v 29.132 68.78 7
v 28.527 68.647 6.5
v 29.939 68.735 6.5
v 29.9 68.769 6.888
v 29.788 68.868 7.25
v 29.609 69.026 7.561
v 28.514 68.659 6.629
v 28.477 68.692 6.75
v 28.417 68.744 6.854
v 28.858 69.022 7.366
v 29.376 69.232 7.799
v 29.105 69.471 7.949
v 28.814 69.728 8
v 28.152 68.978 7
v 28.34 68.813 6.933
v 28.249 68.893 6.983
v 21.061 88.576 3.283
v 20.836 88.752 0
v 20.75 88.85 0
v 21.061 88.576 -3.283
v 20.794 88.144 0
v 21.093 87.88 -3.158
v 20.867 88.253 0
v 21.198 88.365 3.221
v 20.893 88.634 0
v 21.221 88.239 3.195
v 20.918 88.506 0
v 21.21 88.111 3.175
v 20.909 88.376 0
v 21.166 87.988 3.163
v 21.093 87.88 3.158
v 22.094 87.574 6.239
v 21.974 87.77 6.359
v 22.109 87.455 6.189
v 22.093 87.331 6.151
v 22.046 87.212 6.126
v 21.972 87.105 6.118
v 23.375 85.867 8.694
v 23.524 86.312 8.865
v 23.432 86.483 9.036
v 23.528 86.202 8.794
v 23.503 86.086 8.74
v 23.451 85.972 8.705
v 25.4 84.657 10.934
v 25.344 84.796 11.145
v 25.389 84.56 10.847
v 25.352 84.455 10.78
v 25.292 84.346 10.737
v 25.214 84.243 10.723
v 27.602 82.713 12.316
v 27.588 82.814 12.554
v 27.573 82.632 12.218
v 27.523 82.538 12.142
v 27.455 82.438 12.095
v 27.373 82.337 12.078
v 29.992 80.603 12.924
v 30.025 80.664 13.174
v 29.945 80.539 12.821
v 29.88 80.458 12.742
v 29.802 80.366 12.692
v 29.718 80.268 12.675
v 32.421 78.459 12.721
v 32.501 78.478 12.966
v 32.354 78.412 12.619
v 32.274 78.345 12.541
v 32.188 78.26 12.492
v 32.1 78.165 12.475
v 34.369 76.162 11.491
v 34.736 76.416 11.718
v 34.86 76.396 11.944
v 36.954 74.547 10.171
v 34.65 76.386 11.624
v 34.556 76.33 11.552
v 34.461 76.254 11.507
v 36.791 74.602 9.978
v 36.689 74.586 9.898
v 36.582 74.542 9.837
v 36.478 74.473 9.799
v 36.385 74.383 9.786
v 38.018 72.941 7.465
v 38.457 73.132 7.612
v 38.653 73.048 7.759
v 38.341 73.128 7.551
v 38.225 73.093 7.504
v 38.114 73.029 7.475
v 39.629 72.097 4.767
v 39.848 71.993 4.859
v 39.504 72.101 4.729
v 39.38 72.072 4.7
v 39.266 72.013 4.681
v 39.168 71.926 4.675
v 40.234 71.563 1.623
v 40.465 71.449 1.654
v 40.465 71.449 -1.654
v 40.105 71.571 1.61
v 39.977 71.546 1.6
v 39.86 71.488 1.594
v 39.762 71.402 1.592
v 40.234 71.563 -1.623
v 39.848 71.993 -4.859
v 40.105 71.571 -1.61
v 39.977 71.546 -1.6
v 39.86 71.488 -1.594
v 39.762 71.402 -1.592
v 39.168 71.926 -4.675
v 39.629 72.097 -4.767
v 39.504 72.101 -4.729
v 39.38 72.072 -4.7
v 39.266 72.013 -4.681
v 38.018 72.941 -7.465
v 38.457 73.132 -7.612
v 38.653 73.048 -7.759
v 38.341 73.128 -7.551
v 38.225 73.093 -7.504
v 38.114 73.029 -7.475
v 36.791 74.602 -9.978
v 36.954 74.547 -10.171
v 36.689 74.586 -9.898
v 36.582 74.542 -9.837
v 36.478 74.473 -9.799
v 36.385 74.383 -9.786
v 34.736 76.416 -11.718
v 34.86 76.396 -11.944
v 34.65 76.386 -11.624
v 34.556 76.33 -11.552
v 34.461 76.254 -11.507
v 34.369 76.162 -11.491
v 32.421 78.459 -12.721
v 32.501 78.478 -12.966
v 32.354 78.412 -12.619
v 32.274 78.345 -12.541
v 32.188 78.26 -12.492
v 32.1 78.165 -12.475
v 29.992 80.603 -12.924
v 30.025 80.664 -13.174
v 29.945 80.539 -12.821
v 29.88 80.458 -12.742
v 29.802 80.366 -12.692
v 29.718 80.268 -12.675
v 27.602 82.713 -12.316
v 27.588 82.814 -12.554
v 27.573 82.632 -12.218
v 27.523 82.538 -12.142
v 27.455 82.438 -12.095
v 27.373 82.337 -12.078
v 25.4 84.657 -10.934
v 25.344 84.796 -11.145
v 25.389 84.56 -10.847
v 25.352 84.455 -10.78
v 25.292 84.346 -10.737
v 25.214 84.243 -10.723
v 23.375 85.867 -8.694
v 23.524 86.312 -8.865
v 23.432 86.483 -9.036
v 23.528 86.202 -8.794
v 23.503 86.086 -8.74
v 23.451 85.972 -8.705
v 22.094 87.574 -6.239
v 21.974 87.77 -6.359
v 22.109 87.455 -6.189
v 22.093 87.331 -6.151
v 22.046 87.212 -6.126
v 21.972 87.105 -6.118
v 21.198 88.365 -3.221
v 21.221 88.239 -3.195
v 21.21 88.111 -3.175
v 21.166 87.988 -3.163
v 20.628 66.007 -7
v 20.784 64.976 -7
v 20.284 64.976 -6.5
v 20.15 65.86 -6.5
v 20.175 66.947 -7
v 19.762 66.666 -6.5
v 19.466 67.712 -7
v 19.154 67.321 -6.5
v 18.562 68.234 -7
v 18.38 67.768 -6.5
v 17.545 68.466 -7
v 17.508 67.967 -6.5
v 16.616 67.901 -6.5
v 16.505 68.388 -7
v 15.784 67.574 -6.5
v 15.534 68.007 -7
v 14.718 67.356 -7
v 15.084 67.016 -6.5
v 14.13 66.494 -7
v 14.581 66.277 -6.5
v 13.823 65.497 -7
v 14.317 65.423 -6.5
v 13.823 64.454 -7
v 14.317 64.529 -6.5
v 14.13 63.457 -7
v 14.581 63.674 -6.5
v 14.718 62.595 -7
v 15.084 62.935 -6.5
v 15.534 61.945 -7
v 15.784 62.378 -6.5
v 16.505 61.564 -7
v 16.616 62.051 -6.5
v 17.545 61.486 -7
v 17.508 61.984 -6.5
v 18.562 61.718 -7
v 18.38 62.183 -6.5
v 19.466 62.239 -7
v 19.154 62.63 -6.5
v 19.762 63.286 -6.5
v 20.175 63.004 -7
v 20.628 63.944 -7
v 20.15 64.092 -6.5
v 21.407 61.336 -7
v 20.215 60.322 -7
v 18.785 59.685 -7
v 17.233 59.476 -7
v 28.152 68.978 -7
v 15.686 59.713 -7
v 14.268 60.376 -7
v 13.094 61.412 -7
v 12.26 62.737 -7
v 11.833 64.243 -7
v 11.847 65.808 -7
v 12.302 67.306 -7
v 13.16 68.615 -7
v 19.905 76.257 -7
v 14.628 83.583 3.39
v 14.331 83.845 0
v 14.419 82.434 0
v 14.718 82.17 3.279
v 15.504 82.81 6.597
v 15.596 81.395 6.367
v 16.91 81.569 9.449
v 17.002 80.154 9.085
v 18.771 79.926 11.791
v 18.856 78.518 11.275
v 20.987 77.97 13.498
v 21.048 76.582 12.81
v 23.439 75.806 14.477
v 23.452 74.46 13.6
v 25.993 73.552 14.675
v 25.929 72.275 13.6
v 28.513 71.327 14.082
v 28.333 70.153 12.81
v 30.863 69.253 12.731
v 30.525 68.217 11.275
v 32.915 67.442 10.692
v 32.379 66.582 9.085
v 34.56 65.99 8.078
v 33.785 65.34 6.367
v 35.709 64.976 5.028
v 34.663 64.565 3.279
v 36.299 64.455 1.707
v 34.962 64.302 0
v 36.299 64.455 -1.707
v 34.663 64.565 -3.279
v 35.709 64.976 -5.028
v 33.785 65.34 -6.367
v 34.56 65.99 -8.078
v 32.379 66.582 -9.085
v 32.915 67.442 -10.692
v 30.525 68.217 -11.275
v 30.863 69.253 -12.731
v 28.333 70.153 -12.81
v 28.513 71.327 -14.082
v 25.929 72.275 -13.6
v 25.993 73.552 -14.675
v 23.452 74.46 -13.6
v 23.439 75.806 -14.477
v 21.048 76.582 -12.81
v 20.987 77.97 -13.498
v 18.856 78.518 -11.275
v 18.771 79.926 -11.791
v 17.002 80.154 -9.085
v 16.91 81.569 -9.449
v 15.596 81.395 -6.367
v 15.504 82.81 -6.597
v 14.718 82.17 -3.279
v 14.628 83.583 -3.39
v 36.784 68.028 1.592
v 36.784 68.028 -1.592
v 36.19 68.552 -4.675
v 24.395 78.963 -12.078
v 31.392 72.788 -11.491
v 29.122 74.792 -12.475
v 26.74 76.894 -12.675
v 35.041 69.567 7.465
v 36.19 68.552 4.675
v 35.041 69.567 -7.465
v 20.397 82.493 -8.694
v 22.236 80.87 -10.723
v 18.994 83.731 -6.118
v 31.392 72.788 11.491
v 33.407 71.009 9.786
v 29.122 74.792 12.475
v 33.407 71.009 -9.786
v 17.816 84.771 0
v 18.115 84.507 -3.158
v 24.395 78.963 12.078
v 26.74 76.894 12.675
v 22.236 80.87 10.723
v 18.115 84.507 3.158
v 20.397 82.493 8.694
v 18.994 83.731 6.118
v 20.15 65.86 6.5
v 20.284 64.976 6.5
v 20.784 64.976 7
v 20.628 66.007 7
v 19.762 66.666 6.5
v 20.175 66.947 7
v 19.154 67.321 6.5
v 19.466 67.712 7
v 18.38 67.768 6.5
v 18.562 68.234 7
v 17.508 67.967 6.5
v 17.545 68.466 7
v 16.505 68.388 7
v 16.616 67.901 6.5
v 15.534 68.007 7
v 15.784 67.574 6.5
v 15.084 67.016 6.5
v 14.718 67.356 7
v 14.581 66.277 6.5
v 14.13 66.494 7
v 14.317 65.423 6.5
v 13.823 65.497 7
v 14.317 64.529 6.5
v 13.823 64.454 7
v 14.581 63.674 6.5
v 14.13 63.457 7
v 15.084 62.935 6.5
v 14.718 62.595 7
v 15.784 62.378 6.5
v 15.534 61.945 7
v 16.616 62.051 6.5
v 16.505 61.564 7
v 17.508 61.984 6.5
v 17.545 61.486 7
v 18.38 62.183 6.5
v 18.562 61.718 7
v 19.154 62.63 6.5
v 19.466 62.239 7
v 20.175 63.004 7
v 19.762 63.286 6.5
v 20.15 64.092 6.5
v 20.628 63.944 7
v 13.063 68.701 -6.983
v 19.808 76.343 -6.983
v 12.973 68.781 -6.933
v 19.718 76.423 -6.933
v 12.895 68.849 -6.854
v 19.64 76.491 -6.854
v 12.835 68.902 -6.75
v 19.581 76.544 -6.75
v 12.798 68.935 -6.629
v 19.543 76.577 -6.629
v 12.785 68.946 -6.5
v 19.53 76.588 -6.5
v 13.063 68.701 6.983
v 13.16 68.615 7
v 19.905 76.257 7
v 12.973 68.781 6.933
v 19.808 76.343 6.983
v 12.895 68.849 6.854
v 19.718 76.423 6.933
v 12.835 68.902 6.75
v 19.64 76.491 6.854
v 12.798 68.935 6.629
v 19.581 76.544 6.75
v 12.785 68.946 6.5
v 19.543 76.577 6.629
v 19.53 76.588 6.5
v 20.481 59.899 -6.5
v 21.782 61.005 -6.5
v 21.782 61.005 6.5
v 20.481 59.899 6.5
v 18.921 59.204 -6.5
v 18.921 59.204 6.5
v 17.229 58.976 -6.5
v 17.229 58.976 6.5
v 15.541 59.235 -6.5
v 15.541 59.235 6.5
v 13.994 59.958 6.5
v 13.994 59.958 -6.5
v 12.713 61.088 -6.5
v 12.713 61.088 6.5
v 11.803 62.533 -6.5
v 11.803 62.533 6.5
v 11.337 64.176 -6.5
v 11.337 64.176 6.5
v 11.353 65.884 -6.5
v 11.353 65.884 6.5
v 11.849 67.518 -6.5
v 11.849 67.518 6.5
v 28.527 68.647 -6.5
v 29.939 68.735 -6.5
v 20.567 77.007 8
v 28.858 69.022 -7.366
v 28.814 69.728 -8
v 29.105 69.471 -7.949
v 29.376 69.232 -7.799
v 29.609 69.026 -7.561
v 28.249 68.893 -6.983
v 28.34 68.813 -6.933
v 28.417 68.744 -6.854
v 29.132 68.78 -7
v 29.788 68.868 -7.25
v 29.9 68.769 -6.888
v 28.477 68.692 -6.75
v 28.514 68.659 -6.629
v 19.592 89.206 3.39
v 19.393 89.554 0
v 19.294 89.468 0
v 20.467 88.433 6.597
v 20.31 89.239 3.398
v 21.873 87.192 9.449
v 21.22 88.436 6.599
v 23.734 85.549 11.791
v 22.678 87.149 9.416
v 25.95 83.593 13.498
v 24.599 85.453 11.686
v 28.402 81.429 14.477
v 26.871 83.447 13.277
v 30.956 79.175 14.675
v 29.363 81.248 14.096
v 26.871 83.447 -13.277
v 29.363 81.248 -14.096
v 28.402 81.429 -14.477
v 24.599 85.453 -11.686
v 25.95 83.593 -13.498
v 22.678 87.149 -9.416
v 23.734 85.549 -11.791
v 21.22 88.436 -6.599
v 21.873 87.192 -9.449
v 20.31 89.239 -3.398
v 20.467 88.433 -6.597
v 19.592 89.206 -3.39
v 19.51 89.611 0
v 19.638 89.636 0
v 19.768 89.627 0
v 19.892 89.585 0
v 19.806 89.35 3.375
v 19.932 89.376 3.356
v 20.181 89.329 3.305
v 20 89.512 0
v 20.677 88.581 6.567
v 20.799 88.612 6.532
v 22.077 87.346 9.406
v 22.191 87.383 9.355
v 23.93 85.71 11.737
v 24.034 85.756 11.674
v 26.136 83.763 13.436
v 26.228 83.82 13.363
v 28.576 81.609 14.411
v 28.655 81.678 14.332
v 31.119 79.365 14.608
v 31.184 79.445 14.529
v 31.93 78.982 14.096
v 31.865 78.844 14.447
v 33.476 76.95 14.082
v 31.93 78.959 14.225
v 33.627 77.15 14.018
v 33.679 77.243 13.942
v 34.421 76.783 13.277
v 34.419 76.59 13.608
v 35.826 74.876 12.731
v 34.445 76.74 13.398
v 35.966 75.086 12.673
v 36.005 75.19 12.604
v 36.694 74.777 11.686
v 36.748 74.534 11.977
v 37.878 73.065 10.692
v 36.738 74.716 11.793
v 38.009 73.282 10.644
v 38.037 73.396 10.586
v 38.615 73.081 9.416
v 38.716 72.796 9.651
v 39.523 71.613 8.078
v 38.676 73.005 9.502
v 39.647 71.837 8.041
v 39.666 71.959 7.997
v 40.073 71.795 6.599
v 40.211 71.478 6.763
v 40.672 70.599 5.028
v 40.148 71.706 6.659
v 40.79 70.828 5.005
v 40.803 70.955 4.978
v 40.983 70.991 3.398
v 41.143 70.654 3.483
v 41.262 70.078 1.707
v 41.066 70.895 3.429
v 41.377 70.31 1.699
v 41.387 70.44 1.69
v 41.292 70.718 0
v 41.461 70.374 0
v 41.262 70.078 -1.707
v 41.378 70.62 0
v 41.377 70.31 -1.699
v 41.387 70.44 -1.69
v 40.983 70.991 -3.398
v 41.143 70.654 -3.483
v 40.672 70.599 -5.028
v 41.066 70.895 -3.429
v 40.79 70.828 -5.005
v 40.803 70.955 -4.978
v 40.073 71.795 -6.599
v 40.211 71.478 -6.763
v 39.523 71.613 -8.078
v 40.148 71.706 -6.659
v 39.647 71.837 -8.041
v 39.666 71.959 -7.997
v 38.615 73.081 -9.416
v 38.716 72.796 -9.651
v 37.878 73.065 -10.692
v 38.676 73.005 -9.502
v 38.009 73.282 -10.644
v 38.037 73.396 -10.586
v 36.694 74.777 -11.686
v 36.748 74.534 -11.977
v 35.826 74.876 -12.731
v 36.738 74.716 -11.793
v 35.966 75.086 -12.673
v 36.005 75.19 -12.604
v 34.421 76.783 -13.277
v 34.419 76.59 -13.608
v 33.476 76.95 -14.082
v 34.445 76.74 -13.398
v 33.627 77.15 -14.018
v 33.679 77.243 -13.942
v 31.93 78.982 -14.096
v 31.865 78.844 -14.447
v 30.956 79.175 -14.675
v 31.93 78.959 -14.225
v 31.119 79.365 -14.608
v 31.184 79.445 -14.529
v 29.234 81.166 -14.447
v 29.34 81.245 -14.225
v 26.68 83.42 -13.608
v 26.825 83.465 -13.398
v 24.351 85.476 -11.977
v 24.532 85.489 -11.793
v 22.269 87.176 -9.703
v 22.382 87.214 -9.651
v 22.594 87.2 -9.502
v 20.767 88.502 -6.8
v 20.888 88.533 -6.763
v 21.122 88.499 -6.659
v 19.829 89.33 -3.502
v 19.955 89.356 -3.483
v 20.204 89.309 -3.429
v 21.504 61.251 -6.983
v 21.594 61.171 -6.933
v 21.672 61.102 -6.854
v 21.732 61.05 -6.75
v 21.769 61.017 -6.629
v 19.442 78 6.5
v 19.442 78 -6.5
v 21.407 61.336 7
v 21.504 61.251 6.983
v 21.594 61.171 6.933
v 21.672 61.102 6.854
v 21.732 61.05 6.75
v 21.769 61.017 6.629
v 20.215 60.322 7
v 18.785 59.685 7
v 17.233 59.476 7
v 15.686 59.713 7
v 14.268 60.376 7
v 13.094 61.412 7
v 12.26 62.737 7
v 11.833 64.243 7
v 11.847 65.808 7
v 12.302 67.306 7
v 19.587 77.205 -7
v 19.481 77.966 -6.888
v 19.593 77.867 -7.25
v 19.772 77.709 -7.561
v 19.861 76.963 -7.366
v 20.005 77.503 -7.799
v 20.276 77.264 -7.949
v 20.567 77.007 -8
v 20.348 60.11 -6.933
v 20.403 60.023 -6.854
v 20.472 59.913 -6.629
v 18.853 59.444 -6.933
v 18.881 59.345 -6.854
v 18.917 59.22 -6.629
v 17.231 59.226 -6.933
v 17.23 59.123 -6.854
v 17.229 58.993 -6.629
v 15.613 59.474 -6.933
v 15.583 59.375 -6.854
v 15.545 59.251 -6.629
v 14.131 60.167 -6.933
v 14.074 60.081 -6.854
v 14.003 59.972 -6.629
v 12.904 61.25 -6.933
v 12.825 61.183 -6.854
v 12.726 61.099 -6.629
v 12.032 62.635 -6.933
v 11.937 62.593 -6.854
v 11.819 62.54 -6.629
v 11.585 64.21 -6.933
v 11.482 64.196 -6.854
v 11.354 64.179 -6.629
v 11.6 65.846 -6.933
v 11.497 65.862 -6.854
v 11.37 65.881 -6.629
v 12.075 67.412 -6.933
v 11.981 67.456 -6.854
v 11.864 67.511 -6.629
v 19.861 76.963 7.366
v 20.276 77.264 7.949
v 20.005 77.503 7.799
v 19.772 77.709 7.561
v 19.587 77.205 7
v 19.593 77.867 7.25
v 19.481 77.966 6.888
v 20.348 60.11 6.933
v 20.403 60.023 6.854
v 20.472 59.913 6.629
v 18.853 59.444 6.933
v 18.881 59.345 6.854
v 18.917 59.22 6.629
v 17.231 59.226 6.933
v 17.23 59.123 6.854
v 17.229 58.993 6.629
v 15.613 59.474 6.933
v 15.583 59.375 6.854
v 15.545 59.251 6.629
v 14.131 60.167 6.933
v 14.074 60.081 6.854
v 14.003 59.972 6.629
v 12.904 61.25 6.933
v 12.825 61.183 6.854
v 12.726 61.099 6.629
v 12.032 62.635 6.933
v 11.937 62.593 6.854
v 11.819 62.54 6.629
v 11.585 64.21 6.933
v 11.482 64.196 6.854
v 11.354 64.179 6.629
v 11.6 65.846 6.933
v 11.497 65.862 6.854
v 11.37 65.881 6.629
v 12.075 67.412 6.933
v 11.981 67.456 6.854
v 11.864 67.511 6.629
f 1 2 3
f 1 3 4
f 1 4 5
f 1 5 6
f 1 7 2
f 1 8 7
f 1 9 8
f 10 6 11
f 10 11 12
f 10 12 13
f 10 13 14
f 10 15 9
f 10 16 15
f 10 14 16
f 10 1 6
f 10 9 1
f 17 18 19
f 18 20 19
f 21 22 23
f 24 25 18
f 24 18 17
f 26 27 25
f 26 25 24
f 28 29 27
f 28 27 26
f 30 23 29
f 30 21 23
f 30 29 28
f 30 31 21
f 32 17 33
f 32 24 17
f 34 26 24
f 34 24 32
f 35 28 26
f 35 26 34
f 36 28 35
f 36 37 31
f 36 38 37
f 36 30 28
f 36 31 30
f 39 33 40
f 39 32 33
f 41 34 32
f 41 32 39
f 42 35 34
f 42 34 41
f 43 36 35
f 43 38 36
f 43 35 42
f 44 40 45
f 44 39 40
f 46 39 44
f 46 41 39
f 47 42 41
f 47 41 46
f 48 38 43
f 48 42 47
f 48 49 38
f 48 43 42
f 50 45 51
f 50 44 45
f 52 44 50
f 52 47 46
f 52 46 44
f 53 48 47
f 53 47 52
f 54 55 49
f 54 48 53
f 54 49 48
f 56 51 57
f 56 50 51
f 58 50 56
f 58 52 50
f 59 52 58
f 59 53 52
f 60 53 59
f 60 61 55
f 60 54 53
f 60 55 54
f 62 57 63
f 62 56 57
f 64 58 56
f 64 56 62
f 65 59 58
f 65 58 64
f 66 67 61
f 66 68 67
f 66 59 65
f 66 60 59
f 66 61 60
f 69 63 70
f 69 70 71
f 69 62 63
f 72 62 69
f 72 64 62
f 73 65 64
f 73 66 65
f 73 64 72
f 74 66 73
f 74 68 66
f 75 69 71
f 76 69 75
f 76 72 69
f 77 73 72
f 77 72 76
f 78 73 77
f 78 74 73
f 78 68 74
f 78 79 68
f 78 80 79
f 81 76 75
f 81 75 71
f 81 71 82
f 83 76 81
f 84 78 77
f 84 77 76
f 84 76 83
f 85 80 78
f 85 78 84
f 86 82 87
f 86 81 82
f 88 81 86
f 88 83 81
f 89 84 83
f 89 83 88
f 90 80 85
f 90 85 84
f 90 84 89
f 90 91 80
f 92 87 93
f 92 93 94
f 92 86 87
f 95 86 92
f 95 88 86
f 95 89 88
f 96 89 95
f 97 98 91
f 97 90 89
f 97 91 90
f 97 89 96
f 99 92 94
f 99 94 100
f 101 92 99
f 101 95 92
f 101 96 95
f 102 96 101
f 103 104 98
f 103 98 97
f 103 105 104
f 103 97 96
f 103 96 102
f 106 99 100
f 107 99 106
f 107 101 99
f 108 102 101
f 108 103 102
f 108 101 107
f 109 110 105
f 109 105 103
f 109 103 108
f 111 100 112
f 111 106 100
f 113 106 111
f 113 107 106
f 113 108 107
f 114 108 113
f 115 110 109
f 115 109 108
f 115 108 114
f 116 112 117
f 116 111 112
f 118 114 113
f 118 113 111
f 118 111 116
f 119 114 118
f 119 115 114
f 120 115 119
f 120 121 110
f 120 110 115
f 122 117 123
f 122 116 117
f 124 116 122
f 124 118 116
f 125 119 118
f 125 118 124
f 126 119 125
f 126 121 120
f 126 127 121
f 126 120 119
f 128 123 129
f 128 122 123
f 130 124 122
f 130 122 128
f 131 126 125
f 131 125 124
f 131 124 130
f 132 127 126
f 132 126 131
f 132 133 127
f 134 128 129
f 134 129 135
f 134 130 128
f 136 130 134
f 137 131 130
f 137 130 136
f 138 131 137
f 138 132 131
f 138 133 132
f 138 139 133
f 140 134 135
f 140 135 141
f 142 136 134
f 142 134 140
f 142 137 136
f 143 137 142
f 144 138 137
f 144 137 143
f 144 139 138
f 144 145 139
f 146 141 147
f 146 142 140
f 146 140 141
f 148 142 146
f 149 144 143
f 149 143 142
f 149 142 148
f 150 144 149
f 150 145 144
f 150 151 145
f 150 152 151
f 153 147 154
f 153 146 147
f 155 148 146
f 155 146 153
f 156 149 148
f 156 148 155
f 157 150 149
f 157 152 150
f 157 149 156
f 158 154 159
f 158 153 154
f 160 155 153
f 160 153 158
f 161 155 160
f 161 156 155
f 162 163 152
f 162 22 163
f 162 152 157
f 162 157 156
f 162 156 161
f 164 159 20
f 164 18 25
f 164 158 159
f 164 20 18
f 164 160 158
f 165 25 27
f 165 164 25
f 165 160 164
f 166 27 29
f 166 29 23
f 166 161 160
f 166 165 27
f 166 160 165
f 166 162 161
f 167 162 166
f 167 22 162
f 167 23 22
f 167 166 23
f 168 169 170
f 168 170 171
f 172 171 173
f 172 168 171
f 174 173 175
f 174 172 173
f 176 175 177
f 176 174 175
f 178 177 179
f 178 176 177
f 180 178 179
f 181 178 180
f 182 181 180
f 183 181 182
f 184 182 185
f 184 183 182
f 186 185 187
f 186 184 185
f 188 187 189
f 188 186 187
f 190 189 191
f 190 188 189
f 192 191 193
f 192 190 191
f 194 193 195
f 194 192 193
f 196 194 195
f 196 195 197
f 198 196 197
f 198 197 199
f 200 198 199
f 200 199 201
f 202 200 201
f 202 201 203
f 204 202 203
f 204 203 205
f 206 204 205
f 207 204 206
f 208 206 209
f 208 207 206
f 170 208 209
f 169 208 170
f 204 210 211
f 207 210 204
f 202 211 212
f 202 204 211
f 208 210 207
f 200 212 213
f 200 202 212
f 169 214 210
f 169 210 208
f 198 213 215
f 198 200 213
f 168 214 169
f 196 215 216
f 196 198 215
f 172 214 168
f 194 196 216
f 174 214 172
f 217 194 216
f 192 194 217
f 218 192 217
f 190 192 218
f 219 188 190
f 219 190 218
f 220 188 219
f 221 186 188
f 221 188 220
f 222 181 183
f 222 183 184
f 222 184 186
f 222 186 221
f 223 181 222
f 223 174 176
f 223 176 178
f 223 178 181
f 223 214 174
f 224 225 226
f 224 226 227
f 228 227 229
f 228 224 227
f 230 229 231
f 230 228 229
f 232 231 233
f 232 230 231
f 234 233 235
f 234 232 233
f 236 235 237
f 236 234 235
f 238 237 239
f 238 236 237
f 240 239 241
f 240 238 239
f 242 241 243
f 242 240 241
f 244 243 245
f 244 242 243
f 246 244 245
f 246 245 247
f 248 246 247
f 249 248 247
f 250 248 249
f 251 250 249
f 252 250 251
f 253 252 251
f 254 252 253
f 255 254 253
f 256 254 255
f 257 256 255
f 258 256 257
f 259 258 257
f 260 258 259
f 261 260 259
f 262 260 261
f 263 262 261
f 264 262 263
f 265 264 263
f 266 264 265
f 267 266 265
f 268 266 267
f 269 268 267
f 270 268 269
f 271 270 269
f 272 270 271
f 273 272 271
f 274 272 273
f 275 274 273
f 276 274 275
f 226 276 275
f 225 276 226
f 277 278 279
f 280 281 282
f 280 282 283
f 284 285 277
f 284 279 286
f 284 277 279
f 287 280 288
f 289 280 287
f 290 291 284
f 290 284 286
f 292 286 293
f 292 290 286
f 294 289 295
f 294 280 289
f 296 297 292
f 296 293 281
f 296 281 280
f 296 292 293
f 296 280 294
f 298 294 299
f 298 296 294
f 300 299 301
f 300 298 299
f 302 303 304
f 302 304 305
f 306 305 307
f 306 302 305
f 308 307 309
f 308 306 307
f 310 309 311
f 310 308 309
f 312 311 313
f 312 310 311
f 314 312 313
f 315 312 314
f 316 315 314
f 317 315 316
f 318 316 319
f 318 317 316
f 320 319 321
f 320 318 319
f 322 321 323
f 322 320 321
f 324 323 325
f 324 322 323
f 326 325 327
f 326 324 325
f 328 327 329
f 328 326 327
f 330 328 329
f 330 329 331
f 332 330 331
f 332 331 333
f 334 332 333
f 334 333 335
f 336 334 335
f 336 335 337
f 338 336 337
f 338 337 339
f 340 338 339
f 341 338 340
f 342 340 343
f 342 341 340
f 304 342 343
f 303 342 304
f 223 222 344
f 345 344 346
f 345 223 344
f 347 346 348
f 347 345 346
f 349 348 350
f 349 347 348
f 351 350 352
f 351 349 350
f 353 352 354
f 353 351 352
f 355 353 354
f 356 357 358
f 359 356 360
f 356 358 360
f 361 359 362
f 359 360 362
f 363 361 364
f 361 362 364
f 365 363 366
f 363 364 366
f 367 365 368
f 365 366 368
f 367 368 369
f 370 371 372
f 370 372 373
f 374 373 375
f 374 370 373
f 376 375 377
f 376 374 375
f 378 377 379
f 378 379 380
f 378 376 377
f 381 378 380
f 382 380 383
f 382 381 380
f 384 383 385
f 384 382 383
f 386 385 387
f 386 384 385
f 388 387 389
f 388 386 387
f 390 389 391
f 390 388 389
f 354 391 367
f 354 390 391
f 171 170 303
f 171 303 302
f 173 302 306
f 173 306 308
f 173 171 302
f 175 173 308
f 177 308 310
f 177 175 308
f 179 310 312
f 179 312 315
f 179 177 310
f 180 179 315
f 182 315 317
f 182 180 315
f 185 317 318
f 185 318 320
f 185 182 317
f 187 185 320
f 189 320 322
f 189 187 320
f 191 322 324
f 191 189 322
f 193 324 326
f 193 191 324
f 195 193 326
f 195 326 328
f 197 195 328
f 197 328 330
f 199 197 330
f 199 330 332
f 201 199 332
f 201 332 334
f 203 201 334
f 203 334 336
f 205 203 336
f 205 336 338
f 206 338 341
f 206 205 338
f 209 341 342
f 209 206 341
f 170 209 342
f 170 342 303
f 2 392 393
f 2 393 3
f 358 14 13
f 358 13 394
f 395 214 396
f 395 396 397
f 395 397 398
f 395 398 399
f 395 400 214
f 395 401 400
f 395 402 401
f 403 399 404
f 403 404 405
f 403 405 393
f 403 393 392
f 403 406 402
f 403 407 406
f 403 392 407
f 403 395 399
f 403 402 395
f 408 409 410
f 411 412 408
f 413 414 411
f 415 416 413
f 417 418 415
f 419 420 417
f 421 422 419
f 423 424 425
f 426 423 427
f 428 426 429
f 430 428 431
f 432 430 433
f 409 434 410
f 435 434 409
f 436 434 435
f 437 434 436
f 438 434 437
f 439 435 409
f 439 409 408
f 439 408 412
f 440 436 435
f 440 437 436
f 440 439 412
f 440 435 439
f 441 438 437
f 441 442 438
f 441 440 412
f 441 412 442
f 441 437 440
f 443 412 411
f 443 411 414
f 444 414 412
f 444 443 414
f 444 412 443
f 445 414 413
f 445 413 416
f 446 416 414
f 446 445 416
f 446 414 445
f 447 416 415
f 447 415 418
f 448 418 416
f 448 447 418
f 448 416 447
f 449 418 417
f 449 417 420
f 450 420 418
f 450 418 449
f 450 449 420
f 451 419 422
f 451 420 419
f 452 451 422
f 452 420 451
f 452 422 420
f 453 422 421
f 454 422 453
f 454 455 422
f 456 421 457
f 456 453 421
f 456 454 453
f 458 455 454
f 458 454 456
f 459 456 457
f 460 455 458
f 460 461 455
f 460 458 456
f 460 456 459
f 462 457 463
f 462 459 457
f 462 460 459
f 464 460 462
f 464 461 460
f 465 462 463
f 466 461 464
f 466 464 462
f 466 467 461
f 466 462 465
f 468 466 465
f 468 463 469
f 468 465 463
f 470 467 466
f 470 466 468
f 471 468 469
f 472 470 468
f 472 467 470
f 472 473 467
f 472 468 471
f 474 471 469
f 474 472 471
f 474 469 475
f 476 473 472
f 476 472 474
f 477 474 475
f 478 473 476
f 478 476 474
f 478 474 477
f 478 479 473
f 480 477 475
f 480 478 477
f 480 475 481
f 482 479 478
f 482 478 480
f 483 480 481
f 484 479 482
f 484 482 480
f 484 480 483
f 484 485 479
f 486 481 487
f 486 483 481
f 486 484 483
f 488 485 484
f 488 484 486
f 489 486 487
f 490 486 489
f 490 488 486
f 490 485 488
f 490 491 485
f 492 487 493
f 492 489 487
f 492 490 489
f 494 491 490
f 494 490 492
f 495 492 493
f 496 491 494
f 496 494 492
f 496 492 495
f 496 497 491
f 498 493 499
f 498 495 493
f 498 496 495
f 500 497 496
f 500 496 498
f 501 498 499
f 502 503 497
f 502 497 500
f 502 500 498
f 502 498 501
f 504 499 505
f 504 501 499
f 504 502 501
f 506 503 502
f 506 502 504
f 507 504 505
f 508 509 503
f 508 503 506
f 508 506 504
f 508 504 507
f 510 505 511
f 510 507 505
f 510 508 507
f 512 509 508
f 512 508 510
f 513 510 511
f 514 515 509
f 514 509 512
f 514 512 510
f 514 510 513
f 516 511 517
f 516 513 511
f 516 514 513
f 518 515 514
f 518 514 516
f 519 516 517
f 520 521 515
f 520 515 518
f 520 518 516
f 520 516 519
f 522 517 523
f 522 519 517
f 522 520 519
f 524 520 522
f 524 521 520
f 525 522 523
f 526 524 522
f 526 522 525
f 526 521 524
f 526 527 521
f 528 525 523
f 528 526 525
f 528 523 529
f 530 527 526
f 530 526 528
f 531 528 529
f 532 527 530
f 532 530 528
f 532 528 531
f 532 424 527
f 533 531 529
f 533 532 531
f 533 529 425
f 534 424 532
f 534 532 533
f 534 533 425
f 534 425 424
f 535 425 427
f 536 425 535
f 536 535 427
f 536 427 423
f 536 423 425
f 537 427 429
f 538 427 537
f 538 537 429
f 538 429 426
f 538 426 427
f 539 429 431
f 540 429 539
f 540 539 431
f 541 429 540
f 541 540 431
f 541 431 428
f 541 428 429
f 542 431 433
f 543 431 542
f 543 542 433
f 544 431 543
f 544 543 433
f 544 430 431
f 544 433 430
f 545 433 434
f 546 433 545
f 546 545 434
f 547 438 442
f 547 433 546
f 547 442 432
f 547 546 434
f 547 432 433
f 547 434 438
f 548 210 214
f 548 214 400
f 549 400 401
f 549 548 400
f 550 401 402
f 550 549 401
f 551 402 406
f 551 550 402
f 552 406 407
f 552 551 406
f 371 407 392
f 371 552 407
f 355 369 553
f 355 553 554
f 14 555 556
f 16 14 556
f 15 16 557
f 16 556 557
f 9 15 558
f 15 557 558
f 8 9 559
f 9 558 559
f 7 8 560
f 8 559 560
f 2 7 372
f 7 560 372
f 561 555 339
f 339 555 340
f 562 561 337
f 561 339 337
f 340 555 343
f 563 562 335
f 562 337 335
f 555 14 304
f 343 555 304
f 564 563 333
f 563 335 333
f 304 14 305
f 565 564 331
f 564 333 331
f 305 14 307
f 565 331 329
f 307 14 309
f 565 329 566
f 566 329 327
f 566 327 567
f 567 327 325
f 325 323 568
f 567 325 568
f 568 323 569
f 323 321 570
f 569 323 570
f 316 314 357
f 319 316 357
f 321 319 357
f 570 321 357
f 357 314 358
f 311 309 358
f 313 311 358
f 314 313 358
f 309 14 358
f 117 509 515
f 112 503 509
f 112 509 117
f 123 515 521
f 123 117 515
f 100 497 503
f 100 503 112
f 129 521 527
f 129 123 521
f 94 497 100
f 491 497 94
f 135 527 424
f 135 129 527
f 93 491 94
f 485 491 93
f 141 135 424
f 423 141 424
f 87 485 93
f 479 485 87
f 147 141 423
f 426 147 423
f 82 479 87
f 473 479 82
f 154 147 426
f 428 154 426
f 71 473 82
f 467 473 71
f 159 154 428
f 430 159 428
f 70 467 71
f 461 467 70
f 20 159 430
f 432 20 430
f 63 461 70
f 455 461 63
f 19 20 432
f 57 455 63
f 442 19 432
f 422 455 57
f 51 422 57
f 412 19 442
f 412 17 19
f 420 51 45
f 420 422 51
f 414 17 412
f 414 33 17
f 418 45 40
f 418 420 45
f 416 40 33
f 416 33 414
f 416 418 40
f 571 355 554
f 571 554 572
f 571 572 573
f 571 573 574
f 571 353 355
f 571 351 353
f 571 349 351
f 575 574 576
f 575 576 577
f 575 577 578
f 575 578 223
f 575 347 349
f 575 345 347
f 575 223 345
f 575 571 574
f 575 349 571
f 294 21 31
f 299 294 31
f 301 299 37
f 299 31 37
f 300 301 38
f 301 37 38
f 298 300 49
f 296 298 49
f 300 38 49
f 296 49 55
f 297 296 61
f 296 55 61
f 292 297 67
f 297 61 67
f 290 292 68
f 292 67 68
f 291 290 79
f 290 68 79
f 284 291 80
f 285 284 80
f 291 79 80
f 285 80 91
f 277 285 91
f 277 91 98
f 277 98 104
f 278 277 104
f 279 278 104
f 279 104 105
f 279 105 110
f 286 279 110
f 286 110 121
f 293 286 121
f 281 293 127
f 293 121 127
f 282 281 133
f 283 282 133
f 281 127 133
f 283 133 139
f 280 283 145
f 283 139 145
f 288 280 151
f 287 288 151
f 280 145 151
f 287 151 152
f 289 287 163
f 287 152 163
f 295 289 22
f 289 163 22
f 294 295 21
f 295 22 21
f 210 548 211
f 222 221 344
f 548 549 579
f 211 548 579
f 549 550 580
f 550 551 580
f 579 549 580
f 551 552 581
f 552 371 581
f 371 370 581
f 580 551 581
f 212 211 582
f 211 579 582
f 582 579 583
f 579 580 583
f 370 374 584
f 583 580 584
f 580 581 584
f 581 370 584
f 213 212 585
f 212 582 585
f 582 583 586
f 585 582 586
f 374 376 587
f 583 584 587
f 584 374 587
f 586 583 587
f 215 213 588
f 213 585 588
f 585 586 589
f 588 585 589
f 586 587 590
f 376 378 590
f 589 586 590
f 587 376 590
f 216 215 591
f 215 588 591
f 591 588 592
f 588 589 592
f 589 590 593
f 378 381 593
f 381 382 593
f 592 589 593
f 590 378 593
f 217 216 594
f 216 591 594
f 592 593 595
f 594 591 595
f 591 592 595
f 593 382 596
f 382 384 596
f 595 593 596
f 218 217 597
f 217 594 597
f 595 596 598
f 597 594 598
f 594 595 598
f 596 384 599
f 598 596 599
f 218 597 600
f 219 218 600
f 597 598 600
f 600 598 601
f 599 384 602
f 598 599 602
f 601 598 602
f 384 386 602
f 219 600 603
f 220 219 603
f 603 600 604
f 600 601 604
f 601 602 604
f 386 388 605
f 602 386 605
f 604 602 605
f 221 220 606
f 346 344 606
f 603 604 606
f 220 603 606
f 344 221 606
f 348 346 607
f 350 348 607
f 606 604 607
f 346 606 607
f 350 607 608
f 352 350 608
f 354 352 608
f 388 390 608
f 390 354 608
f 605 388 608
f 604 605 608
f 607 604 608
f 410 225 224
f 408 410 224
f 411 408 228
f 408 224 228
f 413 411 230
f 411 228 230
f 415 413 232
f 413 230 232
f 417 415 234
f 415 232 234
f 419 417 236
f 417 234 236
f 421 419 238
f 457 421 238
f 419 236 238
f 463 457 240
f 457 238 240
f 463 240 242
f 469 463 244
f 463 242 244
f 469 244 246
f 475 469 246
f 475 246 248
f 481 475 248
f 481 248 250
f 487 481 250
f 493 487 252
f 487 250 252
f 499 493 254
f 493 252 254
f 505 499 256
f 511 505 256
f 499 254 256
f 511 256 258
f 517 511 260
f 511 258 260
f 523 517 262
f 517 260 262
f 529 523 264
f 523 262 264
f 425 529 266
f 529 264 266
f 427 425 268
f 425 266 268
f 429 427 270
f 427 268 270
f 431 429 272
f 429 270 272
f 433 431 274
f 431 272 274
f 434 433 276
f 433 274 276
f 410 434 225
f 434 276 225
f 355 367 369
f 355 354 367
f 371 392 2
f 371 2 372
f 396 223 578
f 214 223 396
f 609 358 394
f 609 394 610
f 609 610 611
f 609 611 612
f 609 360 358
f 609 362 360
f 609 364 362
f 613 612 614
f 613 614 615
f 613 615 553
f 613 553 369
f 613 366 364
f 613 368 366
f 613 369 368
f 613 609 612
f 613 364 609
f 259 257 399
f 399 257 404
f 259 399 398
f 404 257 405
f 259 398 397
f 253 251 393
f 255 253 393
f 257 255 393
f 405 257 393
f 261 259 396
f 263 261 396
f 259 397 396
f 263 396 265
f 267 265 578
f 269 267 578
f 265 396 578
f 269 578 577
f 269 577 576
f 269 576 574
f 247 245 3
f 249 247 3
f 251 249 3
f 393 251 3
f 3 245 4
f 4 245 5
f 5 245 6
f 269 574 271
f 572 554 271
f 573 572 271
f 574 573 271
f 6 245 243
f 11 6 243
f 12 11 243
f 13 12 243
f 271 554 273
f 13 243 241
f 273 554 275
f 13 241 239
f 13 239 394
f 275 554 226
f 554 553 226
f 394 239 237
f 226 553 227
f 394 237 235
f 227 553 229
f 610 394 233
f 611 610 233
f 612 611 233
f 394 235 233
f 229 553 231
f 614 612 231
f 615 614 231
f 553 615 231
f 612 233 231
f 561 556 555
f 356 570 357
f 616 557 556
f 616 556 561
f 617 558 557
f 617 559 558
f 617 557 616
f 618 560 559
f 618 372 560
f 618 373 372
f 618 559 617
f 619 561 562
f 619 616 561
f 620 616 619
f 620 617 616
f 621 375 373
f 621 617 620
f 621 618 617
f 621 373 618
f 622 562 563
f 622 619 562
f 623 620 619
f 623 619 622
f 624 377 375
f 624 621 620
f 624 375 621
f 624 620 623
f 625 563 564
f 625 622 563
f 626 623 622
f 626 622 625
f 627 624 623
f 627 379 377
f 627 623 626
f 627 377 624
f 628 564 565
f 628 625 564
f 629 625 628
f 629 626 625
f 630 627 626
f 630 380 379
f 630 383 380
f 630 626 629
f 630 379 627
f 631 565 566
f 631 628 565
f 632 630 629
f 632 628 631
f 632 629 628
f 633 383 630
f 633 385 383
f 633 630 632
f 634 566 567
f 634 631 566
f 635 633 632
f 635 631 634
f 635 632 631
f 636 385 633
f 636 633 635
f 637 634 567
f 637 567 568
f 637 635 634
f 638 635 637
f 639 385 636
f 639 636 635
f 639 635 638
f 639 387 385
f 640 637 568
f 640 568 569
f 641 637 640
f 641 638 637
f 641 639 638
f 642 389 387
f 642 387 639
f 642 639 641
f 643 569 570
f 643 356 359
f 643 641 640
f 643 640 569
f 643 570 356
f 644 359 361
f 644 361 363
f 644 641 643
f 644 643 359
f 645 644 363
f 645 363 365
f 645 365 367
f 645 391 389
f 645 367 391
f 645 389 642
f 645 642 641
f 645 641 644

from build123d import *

# Parameters (mm, degrees)
BOSS_EXTRUDE1_DEPTH      = 7
BOSS_EXTRUDE1_DEPTH_BACK = 7
SKETCH2_R                = 3.0000000000000018
BOSS_EXTRUDE2_DEPTH      = 2
BOSS_EXTRUDE2_DEPTH_BACK = 2
SKETCH3_R                = 14.700000000000001
BOSS_EXTRUDE3_START      = 5
SKETCH4_R                = 14.700000000000001
SKETCH4_R_2              = 12.699999999999998
BOSS_EXTRUDE3_DEPTH      = 5
FILLET2_R                = 0.5
FILLET4_R                = 0.5
CHAMFER1_SIZE            = 0.5
CHAMFER2_SIZE            = 1


with BuildPart() as part:
    # Sketch2 → Boss-Extrude1 (new, two sides: drawn at the far end of the back side and taken through both)
    with BuildSketch(Plane.XY.offset(-BOSS_EXTRUDE1_DEPTH_BACK)):
        with BuildLine():
            Line((30.512377936980783, 70.89647327651264), (21.781878923827843, 61.0053372557492))
            ThreePointArc((21.781878923827843, 61.0053372557492), (13.313031061350836, 60.477496482202135), (12.78519028780376, 68.94634434467913))
            Line((12.78519028780376, 68.94634434467913), (21.51568930095671, 78.83748036544256))
            Line((21.51568930095671, 78.83748036544256), (30.512377936980783, 70.89647327651264))
        make_face()
        with Locations((17.283534605815802, 64.97584080021417)):
            Circle(SKETCH2_R, mode=Mode.SUBTRACT)
    extrude(amount=BOSS_EXTRUDE1_DEPTH + BOSS_EXTRUDE1_DEPTH_BACK)

    # Sketch3 → Boss-Extrude2 (add, two sides: drawn at the far end of the back side and taken through both)
    with BuildSketch(Plane(origin=(48.53568375746082, 54.98804239970119, 0), x_dir=(0.7497240530020064, -0.66175059074416, 0), z_dir=(0.66175059074416, 0.7497240530020064, 0)).offset(-BOSS_EXTRUDE2_DEPTH_BACK)):
        with Locations((-30.039919418767553, 0)):
            Circle(SKETCH3_R)
    extrude(amount=BOSS_EXTRUDE2_DEPTH + BOSS_EXTRUDE2_DEPTH_BACK)

    # Sketch4 → Boss-Extrude3 (add)
    with BuildSketch(Plane(origin=(49.85918493894915, 56.48749050570521, 0), x_dir=(0.7497240530020064, -0.66175059074416, 0), z_dir=(0.66175059074416, 0.7497240530020064, 0)).offset(BOSS_EXTRUDE3_START)):
        with Locations((-30.03991941876756, 0)):
            Circle(SKETCH4_R)
        with Locations((-30.03991941876756, 0)):
            Circle(SKETCH4_R_2, mode=Mode.SUBTRACT)
    extrude(amount=-BOSS_EXTRUDE3_DEPTH)

    # Fillet2
    fillet2_edges = [part.edges().sort_by_distance(p)[0] for p in [
        (21.12479228105238, 88.51927769444247, -1.56e-15),
        (19.62534417504836, 89.84277887593079, -1.8e-15),
    ]]
    fillet(fillet2_edges, radius=FILLET2_R)

    # Fillet4
    fillet4_edges = [part.edges().sort_by_distance(p)[0] for p in [
        (25.48537783966015, 65.2011812131289, -7),
        (13.313031061350841, 60.47749648220213, -7),
        (16.488689203636067, 73.14218830205883, -7),
        (25.48537783966015, 65.2011812131289, 7),
        (13.313031061350841, 60.47749648220213, 7),
        (16.488689203636067, 73.14218830205883, 7),
    ]]
    fillet(fillet4_edges, radius=FILLET4_R)

    # Chamfer1
    chamfer1_edges = [part.edges().sort_by_distance(p)[0] for p in [
        (14.2835346058158, 64.97584080021417, 7),
        (14.2835346058158, 64.97584080021417, -7),
    ]]
    chamfer(chamfer1_edges, length=CHAMFER1_SIZE)

    # Chamfer2
    chamfer2_edges = [part.edges().sort_by_distance(p)[0] for p in [
        (20.301982665021182, 77.24112112915115, 6.853553390593271),
        (20.192188119468376, 77.33803225943853, -7e-17),
        (20.301982665021182, 77.24112112915115, -6.853553390593271),
        (24.690532437480417, 73.36752871497357, -7),
        (29.079082209939642, 69.493936300796, -6.853553390593275),
        (29.18887675549246, 69.39702517050861, -7e-17),
        (29.079082209939642, 69.493936300796, 6.853553390593275),
        (24.690532437480417, 73.36752871497357, 7),
        (13.66958885835092, 83.09526239891272, -1.8e-15),
    ]]
    chamfer(chamfer2_edges, length=CHAMFER2_SIZE)


solid = part.part
